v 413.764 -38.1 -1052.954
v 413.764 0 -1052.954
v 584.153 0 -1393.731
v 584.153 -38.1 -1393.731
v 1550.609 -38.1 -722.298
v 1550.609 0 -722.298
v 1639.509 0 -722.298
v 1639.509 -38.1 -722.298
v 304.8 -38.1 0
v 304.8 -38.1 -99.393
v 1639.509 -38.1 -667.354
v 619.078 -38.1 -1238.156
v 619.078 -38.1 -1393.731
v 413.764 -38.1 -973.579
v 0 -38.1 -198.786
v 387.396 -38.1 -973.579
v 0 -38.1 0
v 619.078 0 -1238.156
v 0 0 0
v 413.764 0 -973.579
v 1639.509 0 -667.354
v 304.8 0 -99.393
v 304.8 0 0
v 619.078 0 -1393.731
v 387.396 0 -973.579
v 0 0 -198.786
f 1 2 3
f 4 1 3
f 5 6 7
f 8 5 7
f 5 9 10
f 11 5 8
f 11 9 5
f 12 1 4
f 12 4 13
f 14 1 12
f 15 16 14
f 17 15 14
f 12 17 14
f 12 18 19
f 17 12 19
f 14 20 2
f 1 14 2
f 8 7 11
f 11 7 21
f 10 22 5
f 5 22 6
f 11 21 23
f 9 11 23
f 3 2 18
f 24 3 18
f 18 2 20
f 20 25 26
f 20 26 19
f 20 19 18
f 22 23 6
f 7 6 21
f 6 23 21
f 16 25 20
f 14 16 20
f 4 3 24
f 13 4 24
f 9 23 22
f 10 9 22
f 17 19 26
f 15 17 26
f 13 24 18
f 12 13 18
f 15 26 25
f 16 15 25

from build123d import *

# Parameters (mm, degrees)
F1_DEPTH = 38.1
F2_DEPTH = 38.1


with BuildPart() as f1:
    # F0 (on Front) → F1 (new body)
    with BuildSketch(Plane.XZ):
        Polygon((619.07778, -1238.155561), (0, 0), (0, -198.786443), (387.396179, -973.578801), (413.7644, -973.578801), (413.7644, -1052.953801), (584.15278, -1393.730561), (619.07778, -1393.730561), align=None)
    extrude(amount=F1_DEPTH)


with BuildPart() as f2:
    # F0 (on Front) → F2 (new body)
    with BuildSketch(Plane.XZ):
        Polygon((1639.508976, -667.354488), (304.8, 0), (304.8, -99.393222), (1550.608976, -722.297709), (1639.508976, -722.297709), align=None)
    extrude(amount=F2_DEPTH)


solid = Compound([f1.part, f2.part])
